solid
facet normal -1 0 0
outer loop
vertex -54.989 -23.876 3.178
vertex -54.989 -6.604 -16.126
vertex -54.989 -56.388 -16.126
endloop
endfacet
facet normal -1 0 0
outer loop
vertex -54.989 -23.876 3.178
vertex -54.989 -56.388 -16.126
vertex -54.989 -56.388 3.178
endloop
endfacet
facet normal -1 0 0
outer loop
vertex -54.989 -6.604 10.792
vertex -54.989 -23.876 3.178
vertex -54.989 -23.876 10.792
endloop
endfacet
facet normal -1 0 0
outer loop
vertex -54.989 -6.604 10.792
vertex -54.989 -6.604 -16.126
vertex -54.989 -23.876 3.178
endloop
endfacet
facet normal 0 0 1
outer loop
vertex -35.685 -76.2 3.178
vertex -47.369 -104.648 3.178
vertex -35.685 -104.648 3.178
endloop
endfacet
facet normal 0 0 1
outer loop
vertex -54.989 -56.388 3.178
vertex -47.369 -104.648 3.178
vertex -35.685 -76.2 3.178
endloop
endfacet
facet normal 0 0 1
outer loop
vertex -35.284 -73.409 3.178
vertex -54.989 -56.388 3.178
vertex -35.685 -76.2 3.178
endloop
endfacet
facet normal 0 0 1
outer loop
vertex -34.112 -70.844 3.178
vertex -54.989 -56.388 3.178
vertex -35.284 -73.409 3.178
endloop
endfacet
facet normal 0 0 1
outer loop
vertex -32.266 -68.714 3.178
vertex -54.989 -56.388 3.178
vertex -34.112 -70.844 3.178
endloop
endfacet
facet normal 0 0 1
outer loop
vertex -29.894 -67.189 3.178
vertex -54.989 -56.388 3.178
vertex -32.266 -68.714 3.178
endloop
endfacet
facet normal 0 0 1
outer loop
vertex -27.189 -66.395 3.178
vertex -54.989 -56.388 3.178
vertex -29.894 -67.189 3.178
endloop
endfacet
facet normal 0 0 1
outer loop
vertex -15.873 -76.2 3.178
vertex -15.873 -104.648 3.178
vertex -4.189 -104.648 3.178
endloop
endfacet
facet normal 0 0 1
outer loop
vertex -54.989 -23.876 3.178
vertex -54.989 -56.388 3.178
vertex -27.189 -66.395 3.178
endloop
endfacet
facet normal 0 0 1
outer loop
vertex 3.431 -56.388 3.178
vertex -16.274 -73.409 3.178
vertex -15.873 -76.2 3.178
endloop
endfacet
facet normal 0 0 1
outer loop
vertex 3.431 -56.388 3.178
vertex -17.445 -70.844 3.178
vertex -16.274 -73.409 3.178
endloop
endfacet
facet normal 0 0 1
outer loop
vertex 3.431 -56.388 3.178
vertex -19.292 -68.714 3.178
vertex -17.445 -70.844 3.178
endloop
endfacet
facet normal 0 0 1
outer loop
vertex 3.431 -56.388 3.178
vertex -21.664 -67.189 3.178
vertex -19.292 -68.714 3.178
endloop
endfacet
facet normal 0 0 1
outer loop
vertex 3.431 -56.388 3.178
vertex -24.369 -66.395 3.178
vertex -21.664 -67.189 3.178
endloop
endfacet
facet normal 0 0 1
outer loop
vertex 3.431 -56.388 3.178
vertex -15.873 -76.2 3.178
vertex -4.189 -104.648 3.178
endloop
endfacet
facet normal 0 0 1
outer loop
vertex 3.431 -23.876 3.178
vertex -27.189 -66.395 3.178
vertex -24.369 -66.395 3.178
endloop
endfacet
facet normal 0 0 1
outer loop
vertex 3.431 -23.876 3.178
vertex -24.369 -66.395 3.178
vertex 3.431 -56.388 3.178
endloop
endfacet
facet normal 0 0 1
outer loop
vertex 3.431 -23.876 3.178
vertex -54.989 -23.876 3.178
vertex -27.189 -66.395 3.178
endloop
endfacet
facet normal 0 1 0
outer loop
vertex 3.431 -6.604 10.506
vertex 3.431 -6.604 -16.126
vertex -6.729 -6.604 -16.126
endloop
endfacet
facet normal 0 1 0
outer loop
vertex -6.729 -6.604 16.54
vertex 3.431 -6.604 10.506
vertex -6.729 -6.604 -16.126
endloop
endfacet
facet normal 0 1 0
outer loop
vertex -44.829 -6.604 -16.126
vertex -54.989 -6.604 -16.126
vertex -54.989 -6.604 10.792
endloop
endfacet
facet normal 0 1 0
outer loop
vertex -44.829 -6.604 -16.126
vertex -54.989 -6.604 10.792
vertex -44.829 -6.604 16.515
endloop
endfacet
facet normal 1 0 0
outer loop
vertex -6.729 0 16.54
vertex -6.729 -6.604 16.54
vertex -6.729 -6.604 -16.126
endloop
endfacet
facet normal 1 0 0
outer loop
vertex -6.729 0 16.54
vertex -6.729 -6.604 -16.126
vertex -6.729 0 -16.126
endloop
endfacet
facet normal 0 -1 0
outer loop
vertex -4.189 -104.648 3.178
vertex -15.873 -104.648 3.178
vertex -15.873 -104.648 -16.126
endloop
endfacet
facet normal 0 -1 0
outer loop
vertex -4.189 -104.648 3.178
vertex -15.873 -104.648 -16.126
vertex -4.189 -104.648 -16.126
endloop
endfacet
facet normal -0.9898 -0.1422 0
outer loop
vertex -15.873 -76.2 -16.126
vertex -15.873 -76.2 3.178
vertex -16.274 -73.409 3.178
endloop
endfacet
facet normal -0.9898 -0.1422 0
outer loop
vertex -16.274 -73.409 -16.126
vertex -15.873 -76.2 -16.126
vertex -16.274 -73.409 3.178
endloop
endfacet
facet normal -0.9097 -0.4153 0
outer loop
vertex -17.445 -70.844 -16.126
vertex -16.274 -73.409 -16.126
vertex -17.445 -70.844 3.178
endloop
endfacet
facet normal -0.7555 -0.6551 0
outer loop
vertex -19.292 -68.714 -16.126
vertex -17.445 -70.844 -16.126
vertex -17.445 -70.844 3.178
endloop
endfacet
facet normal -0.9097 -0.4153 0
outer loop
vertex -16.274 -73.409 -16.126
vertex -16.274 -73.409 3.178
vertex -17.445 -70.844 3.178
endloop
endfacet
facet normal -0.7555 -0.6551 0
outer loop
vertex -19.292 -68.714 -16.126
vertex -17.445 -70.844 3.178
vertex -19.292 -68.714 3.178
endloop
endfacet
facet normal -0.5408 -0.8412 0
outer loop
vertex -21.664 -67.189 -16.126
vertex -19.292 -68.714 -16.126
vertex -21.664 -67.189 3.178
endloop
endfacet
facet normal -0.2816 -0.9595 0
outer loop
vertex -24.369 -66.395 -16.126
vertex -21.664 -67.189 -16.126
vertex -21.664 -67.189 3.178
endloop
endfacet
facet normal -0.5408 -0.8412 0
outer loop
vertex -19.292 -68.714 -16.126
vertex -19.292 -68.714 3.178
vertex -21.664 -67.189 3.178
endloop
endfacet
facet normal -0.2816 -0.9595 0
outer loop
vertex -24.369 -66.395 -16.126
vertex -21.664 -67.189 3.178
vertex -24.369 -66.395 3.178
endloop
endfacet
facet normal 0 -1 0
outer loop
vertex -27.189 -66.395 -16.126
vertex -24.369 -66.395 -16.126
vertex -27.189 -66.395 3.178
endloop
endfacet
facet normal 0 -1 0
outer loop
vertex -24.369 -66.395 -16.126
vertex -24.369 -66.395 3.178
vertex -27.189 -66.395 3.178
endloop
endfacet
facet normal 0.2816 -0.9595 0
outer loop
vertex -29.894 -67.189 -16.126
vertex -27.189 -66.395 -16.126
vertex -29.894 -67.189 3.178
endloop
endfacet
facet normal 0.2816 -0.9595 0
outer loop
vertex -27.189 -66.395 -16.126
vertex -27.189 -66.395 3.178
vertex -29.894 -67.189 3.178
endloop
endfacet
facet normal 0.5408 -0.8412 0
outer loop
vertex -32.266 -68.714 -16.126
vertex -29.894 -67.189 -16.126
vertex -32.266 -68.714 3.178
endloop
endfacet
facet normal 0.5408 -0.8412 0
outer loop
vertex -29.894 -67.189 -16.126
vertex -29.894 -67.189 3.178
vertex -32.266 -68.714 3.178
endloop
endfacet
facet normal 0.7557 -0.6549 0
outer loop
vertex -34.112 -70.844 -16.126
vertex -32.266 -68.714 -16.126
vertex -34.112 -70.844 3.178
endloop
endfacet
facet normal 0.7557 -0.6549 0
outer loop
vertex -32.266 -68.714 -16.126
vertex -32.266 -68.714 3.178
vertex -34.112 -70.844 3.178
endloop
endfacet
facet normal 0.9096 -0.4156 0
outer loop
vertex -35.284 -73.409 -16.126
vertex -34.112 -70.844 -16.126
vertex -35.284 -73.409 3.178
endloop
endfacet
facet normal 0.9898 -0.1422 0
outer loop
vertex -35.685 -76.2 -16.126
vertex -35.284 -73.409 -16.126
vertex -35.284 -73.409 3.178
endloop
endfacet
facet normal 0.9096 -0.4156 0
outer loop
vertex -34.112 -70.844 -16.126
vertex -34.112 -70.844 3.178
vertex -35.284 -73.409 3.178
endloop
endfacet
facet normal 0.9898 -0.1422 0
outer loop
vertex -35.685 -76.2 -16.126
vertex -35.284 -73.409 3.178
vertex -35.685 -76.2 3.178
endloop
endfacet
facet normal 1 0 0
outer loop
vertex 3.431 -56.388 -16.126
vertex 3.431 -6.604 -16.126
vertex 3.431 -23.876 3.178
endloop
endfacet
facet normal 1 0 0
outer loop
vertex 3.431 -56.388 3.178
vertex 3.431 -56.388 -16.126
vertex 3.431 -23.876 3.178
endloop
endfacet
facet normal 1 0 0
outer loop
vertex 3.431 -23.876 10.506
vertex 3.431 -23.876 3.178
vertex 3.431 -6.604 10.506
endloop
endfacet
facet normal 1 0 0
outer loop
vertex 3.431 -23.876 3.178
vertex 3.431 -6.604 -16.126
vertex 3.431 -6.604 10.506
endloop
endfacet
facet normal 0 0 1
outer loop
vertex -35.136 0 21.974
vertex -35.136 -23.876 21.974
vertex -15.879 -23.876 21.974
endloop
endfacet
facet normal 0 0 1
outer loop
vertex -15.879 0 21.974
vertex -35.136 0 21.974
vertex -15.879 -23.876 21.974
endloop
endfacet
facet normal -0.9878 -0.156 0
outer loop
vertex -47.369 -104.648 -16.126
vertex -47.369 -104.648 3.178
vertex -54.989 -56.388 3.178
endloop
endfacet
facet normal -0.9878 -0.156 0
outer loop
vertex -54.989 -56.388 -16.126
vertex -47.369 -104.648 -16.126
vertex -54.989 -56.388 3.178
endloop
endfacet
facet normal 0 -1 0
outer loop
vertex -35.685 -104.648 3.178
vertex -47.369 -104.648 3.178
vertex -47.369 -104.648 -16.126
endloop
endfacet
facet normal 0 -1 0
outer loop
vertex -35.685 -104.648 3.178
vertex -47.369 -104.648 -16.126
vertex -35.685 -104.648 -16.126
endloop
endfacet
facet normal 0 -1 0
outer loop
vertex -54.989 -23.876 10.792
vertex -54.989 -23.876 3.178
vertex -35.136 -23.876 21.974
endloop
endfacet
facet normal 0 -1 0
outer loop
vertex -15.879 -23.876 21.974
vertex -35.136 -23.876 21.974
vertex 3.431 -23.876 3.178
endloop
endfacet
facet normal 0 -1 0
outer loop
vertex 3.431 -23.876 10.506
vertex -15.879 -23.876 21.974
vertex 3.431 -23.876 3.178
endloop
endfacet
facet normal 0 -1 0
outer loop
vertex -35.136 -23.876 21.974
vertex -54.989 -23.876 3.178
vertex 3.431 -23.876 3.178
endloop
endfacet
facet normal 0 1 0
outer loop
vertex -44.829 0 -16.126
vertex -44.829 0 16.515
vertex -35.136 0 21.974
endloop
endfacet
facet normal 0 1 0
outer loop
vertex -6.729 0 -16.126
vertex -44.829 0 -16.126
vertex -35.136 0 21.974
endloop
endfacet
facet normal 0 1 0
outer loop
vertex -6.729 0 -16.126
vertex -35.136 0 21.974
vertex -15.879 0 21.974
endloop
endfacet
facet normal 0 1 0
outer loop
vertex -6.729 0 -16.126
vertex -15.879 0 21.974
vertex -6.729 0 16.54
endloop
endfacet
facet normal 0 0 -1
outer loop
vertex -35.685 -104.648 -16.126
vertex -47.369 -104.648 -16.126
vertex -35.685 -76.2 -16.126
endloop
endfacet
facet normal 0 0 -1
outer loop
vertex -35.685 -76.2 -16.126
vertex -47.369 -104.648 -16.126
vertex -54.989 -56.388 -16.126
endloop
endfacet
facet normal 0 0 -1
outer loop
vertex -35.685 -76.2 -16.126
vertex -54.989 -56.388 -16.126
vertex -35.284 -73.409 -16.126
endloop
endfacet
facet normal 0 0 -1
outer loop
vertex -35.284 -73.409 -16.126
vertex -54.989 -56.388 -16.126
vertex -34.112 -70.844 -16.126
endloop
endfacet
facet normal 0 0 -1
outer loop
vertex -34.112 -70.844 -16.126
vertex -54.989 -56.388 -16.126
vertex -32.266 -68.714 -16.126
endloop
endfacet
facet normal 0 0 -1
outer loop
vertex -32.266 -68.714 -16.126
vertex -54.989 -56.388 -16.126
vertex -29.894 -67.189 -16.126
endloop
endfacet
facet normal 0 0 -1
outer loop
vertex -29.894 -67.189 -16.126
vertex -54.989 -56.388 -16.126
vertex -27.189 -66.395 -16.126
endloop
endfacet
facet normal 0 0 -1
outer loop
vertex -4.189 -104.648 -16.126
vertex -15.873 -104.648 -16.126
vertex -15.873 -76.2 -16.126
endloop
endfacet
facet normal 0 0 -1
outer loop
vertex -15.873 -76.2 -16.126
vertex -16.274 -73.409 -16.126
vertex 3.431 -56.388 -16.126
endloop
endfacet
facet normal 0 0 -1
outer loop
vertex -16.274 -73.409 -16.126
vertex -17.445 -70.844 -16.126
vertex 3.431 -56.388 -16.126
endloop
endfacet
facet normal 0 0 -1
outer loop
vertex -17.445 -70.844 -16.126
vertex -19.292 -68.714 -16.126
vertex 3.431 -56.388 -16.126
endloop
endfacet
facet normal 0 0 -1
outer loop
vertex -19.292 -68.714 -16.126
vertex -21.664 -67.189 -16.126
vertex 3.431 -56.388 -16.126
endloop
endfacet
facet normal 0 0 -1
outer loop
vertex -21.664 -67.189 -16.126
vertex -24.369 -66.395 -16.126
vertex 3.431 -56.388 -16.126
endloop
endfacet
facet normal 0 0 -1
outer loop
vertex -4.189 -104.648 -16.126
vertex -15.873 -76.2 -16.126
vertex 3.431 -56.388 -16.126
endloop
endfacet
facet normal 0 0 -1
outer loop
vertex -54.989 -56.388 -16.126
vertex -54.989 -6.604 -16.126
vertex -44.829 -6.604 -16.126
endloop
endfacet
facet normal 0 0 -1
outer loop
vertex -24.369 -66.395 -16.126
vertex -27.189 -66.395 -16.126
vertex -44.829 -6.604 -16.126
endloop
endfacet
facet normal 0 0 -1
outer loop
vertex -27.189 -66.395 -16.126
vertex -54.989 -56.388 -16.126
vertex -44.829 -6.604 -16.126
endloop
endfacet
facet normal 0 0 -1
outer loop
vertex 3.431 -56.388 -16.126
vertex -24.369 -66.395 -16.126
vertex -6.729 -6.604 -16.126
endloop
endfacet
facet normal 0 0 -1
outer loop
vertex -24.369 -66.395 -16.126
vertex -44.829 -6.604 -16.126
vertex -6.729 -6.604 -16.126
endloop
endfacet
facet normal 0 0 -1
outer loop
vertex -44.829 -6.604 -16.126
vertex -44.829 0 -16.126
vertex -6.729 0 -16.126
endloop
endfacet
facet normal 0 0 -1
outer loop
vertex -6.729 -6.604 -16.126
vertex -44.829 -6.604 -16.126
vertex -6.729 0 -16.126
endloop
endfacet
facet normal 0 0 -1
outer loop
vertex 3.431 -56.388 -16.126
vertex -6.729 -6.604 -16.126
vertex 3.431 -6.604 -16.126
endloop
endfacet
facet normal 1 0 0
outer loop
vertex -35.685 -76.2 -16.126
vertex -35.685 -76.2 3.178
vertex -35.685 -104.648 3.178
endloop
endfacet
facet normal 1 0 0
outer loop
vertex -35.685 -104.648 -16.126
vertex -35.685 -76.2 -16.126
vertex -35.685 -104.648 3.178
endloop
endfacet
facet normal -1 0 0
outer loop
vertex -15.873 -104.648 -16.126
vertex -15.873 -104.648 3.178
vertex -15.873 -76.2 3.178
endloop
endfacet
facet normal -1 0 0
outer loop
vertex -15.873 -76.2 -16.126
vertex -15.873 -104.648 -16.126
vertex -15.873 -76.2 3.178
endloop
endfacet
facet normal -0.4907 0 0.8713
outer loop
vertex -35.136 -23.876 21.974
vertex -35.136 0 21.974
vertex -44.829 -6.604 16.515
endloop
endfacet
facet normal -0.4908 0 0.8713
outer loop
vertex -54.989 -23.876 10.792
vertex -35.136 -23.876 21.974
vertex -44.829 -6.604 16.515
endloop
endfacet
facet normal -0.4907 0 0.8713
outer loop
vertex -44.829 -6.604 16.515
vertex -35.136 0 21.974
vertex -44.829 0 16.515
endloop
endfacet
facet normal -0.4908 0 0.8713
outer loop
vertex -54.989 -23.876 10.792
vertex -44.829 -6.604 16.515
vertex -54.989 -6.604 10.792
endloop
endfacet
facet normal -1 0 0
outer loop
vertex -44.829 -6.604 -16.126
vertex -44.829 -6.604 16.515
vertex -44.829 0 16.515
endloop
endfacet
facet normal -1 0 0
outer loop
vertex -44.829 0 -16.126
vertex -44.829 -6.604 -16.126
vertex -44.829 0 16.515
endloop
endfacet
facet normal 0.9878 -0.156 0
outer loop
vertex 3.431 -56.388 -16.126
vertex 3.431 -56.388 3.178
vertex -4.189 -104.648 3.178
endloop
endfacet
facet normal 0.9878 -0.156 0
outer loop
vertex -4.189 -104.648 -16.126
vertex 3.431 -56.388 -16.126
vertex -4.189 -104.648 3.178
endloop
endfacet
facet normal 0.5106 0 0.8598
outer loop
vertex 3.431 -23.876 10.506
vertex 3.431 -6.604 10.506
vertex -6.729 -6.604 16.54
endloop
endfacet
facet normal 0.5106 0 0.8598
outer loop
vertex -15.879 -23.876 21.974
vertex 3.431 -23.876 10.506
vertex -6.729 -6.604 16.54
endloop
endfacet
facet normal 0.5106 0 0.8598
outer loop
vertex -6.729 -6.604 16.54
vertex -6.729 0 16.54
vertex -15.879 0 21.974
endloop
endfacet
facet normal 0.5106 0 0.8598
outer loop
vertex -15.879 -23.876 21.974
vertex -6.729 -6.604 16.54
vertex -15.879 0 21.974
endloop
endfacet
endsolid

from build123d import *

# Parameters (mm, degrees)
F0_W      = 58.42
F0_H      = 19.304
F1_DEPTH  = 104.648
F3_DEPTH  = 254
F4_DEPTH  = 18.796
F2_W      = 10.16
F2_H      = 6.604
F5_DEPTH  = 254
F8_DEPTH  = 25.4
F10_DEPTH = 25.4


with BuildPart() as f1:
    # F0 (on Front) → F1 (new body)
    with BuildSketch(Plane.XZ):
        with Locations((-25.778878, -6.473551)):
            Rectangle(F0_W, F0_H)
    extrude(amount=F1_DEPTH)

    # F2 (on face) → F3 (cut)
    with BuildSketch(Plane.XY.offset(3.178449)):
        with BuildLine():
            ThreePointArc((-35.684878, -76.2), (-25.778878, -86.106), (-15.872878, -76.2))
            Line((-15.872878, -76.2), (-35.684878, -76.2))
        make_face()
        with BuildLine():
            Line((-35.684878, -76.2), (-15.872878, -76.2))
            ThreePointArc((-15.872878, -76.2), (-25.778878, -66.294), (-35.684878, -76.2))
        make_face()
        with BuildLine():
            Line((-35.684878, -104.648), (-25.778878, -104.648))
            Line((-25.778878, -104.648), (-15.872878, -104.648))
            Line((-15.872878, -104.648), (-15.872878, -76.2))
            ThreePointArc((-15.872878, -76.2), (-25.778878, -86.106), (-35.684878, -76.2))
            Line((-35.684878, -76.2), (-35.684878, -104.648))
        make_face()
        Polygon((-54.988878, -104.648), (-47.368878, -104.648), (-54.988878, -56.388), align=None)
        Polygon((3.431122, -56.388), (-4.188878, -104.648), (3.431122, -104.648), align=None)
    extrude(amount=-F3_DEPTH, mode=Mode.SUBTRACT)

    # F2 (on face) → F4 (join)
    with BuildSketch(Plane.XY.offset(3.178449)):
        Polygon((-54.988878, -23.876), (3.431122, -23.876), (3.431122, -6.604), (-6.728878, -6.604), (-6.728878, 0), (-44.828878, 0), (-44.828878, -6.604), (-54.988878, -6.604), align=None)
    extrude(amount=F4_DEPTH)

    # F2 (on face) → F5 (cut)
    with BuildSketch(Plane.XY.offset(3.178449)):
        with BuildLine():
            Line((-35.684878, -104.648), (-25.778878, -104.648))
            Line((-25.778878, -104.648), (-15.872878, -104.648))
            Line((-15.872878, -104.648), (-15.872878, -76.2))
            ThreePointArc((-15.872878, -76.2), (-25.778878, -86.106), (-35.684878, -76.2))
            Line((-35.684878, -76.2), (-35.684878, -104.648))
        make_face()
        with BuildLine():
            Line((-35.684878, -76.2), (-15.872878, -76.2))
            ThreePointArc((-15.872878, -76.2), (-25.778878, -66.294), (-35.684878, -76.2))
        make_face()
        Polygon((-54.988878, -56.388), (-54.988878, -104.648), (-47.368878, -104.648), align=None)
        Polygon((-4.188878, -104.648), (3.431122, -104.648), (3.431122, -56.388), align=None)
        with Locations((-49.908878, -3.302)):
            Rectangle(F2_W, F2_H)
        with Locations((-1.648878, -3.302)):
            Rectangle(F2_W, F2_H)
    extrude(amount=-F5_DEPTH, mode=Mode.SUBTRACT)

    # F7 (on face) → F8 (cut)
    with BuildSketch(Plane(origin=(0, 0, 0), x_dir=(-1, 0, 0), z_dir=(0, 1, 0))):
        Polygon((86.693414, 21.974449), (35.135657, 21.974449), (86.693414, -7.065322), align=None)
    extrude(amount=-F8_DEPTH, mode=Mode.SUBTRACT)

    # F9 (on face) → F10 (cut)
    with BuildSketch(Plane(origin=(0, 0, 0), x_dir=(-1, 0, 0), z_dir=(0, 1, 0))):
        Polygon((-10.884415, 32.844201), (-3.437184, 10.502506), (34.180883, 32.844201), align=None)
    extrude(amount=-F10_DEPTH, mode=Mode.SUBTRACT)


solid = f1.part
